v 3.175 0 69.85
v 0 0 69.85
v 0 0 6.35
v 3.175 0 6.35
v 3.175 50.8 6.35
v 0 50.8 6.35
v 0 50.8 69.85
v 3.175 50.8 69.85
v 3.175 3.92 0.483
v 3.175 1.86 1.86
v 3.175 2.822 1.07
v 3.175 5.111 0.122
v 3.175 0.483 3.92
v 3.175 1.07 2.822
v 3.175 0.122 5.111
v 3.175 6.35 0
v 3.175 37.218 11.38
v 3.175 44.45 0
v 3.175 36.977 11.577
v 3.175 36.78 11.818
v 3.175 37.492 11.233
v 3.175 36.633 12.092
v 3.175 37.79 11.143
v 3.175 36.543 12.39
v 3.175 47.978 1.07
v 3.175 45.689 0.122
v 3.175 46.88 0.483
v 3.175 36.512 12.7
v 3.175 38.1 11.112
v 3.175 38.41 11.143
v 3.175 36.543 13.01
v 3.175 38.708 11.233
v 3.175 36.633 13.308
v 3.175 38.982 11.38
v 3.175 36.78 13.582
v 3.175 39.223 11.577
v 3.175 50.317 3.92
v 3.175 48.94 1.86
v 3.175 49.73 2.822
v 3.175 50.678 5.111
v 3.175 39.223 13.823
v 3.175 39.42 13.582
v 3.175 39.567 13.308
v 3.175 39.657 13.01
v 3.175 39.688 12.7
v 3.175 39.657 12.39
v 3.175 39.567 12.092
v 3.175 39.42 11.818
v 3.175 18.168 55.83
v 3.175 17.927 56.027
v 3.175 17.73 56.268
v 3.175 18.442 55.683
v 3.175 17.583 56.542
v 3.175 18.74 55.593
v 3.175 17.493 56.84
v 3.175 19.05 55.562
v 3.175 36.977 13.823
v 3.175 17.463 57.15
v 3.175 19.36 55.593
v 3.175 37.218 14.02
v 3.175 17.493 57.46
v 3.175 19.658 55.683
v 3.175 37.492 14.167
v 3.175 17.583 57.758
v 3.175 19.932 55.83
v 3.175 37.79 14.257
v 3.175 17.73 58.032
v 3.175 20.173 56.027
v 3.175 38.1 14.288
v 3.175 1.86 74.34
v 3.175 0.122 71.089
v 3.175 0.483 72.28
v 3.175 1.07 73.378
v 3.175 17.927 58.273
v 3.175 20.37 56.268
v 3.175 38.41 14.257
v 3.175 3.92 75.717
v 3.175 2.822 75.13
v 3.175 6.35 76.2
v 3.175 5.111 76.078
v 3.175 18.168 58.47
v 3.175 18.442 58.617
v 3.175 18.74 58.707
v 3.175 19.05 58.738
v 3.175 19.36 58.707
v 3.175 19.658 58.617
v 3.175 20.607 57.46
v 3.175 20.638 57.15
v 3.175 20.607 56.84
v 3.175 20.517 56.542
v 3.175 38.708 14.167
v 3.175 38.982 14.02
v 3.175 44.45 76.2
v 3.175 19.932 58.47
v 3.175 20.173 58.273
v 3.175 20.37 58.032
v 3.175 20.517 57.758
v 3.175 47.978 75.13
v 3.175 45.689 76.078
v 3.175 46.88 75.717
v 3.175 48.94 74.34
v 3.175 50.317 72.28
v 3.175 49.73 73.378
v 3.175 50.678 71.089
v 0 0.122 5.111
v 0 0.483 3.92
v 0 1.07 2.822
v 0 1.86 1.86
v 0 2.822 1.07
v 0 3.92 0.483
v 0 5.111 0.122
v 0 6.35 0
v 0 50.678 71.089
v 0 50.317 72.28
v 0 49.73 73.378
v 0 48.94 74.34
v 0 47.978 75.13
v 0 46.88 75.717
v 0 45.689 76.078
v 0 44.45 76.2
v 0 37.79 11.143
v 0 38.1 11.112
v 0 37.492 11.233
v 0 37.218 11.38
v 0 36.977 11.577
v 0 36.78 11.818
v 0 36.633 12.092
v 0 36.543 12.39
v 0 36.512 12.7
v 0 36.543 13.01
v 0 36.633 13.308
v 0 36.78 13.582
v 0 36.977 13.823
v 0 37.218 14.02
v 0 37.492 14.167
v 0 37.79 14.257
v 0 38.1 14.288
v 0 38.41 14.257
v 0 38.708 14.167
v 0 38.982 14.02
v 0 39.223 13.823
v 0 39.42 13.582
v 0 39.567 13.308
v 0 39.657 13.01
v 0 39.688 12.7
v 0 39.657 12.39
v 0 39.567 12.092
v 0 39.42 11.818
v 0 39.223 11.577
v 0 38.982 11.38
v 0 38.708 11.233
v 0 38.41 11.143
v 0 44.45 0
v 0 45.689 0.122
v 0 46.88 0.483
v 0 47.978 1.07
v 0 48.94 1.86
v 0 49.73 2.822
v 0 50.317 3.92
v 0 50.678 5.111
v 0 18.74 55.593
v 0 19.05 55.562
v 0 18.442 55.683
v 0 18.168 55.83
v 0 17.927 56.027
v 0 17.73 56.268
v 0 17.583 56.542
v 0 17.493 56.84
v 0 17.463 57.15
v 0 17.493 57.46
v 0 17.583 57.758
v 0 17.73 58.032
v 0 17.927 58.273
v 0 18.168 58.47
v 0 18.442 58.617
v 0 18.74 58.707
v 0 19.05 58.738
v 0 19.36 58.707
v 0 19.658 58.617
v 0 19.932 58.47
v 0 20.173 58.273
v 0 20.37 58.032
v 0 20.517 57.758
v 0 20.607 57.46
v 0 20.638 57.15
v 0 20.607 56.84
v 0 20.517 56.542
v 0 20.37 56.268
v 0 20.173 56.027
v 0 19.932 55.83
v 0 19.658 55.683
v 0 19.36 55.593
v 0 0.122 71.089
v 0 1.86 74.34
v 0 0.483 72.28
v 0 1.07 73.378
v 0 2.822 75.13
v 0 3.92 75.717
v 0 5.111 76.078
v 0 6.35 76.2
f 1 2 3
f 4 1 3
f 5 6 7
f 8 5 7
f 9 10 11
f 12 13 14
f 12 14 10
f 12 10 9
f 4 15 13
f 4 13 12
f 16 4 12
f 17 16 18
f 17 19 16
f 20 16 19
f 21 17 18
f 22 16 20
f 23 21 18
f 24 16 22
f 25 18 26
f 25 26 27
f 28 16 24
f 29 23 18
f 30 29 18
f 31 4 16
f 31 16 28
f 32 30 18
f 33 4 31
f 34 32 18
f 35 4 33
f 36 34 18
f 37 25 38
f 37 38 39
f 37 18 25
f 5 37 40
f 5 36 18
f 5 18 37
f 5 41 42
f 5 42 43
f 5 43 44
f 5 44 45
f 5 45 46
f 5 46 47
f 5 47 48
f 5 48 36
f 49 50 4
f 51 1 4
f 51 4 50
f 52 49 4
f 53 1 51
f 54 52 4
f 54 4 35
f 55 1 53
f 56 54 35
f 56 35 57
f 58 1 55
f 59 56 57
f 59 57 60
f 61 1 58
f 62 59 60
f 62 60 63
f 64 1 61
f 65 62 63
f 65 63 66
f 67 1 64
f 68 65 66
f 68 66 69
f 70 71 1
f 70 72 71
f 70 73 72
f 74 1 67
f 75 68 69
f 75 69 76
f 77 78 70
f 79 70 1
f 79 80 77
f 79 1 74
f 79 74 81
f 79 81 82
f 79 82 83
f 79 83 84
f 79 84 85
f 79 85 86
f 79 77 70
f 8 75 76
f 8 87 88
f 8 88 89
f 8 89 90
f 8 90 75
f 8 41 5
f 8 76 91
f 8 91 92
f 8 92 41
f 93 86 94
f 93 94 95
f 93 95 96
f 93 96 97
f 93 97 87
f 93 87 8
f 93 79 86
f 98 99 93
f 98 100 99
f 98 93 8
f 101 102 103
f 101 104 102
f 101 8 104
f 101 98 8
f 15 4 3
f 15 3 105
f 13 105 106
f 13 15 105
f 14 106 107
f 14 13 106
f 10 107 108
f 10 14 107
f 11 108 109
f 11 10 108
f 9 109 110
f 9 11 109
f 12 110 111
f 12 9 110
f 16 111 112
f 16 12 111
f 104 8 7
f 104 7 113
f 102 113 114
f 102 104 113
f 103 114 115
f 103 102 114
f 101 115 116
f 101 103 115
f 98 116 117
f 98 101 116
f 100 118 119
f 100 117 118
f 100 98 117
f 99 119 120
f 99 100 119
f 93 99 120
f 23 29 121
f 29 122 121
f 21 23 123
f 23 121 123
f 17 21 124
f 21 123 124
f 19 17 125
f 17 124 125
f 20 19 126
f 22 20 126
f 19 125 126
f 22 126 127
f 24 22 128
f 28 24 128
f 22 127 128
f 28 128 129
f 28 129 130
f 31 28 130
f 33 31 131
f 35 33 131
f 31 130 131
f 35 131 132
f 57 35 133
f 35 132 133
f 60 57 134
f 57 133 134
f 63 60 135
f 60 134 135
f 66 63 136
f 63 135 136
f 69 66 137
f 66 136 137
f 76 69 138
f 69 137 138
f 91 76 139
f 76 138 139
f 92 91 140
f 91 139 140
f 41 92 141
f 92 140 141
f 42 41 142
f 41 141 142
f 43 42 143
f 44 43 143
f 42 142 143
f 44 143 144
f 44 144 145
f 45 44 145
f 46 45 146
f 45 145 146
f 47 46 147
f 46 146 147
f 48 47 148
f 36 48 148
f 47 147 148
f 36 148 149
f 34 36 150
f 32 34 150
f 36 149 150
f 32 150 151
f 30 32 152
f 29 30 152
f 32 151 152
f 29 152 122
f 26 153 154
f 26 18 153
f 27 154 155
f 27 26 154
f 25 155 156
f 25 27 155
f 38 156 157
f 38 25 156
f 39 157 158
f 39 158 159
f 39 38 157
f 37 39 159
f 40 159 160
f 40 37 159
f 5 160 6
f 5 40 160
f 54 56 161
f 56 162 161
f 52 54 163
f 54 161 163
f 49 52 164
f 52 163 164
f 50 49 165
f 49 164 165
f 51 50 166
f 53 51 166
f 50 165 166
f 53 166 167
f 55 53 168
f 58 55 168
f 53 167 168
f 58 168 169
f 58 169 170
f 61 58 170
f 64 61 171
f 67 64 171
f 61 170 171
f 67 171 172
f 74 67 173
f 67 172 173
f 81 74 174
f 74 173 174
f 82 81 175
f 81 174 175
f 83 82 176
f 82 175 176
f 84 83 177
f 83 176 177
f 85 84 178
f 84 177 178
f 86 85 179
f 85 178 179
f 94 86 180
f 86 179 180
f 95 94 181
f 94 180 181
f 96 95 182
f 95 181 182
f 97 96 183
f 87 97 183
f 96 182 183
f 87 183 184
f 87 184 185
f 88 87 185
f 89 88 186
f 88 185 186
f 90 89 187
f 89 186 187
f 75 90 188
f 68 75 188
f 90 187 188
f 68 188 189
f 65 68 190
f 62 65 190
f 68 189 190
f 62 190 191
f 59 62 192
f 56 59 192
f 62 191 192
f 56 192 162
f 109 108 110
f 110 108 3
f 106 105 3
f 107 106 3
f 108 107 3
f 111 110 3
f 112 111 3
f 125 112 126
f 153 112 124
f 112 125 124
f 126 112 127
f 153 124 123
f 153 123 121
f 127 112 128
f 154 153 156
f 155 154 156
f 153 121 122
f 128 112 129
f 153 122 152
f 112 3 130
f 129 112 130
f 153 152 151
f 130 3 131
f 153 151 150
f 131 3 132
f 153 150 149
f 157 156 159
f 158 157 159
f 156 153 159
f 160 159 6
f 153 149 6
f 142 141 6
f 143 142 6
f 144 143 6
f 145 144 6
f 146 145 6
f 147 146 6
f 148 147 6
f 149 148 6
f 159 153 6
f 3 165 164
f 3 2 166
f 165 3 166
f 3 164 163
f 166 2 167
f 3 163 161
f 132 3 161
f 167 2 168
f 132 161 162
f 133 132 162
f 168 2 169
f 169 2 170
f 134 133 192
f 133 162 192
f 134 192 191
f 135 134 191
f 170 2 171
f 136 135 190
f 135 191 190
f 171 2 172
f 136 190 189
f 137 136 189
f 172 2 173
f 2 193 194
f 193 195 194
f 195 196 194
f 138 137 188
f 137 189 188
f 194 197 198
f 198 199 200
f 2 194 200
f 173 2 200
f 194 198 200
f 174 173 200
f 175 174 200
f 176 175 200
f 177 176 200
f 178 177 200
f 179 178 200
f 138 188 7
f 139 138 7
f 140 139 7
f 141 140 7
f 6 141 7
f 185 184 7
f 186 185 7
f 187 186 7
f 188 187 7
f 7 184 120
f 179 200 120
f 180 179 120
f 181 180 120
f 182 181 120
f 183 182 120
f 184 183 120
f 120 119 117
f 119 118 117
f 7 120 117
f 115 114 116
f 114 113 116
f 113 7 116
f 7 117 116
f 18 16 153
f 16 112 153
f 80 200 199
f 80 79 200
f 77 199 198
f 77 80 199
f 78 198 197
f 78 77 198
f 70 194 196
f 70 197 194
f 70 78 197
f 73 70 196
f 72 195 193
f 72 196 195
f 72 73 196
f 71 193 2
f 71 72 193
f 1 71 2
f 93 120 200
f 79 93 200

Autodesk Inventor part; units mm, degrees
ref_plane "YZ Plane" through (0, 0, 0) normal (1, 0, 0) x (0, 1, 0)
ref_plane "XZ Plane" through (0, 0, 0) normal (0, 1, 0) x (-1, 0, 0)
ref_plane "XY Plane" through (0, 0, 0) normal (0, 0, 1) x (1, 0, 0)
sketch "Sketch1" plane through (0, 0, 0) normal (1, 0, 0) x (0, 1, 0)
  line L0 (0, 0) -> (50.8, 0)
  line L1 (50.8, 0) -> (50.8, 76.2)
  line L2 (50.8, 76.2) -> (0, 76.2)
  line L3 (0, 76.2) -> (0, 0)
  dimension "d0" = 50.8
  dimension "d1" = 76.2
extrude "Extrusion1" add sketch "Sketch1" along normal blind 3.175
sketch "Sketch2" plane through (3.175, 0, 0) normal (1, 0, 0) x (0, 0, -1)
  line L0 (0, 0) -> (0, 50.8) projected
  line L1 (0, 50.8) -> (-76.2, 50.8) projected
  line L2 (-76.2, 50.8) -> (-76.2, 0) projected
  point P0 (-57.15, 19.05)
  point P1 (-12.7, 38.1)
  dimension "d4" = 12.7
  dimension "d5" = 12.7
  dimension "d6" = 31.75
  dimension "d7" = 19.05
hole "Hole1" at (3.175, 19.05, 57.15) at (3.175, 38.1, 12.7) direction (-1, 0, 0) diameter 3.175 end through all
fillet "Fillet1" radius 6.35 4 edges at (1.5875, 50.8, 76.2) (1.5875, 0, 76.2) (1.5875, 0, 0) (1.5875, 50.8, 0)
properties part number "Base"
